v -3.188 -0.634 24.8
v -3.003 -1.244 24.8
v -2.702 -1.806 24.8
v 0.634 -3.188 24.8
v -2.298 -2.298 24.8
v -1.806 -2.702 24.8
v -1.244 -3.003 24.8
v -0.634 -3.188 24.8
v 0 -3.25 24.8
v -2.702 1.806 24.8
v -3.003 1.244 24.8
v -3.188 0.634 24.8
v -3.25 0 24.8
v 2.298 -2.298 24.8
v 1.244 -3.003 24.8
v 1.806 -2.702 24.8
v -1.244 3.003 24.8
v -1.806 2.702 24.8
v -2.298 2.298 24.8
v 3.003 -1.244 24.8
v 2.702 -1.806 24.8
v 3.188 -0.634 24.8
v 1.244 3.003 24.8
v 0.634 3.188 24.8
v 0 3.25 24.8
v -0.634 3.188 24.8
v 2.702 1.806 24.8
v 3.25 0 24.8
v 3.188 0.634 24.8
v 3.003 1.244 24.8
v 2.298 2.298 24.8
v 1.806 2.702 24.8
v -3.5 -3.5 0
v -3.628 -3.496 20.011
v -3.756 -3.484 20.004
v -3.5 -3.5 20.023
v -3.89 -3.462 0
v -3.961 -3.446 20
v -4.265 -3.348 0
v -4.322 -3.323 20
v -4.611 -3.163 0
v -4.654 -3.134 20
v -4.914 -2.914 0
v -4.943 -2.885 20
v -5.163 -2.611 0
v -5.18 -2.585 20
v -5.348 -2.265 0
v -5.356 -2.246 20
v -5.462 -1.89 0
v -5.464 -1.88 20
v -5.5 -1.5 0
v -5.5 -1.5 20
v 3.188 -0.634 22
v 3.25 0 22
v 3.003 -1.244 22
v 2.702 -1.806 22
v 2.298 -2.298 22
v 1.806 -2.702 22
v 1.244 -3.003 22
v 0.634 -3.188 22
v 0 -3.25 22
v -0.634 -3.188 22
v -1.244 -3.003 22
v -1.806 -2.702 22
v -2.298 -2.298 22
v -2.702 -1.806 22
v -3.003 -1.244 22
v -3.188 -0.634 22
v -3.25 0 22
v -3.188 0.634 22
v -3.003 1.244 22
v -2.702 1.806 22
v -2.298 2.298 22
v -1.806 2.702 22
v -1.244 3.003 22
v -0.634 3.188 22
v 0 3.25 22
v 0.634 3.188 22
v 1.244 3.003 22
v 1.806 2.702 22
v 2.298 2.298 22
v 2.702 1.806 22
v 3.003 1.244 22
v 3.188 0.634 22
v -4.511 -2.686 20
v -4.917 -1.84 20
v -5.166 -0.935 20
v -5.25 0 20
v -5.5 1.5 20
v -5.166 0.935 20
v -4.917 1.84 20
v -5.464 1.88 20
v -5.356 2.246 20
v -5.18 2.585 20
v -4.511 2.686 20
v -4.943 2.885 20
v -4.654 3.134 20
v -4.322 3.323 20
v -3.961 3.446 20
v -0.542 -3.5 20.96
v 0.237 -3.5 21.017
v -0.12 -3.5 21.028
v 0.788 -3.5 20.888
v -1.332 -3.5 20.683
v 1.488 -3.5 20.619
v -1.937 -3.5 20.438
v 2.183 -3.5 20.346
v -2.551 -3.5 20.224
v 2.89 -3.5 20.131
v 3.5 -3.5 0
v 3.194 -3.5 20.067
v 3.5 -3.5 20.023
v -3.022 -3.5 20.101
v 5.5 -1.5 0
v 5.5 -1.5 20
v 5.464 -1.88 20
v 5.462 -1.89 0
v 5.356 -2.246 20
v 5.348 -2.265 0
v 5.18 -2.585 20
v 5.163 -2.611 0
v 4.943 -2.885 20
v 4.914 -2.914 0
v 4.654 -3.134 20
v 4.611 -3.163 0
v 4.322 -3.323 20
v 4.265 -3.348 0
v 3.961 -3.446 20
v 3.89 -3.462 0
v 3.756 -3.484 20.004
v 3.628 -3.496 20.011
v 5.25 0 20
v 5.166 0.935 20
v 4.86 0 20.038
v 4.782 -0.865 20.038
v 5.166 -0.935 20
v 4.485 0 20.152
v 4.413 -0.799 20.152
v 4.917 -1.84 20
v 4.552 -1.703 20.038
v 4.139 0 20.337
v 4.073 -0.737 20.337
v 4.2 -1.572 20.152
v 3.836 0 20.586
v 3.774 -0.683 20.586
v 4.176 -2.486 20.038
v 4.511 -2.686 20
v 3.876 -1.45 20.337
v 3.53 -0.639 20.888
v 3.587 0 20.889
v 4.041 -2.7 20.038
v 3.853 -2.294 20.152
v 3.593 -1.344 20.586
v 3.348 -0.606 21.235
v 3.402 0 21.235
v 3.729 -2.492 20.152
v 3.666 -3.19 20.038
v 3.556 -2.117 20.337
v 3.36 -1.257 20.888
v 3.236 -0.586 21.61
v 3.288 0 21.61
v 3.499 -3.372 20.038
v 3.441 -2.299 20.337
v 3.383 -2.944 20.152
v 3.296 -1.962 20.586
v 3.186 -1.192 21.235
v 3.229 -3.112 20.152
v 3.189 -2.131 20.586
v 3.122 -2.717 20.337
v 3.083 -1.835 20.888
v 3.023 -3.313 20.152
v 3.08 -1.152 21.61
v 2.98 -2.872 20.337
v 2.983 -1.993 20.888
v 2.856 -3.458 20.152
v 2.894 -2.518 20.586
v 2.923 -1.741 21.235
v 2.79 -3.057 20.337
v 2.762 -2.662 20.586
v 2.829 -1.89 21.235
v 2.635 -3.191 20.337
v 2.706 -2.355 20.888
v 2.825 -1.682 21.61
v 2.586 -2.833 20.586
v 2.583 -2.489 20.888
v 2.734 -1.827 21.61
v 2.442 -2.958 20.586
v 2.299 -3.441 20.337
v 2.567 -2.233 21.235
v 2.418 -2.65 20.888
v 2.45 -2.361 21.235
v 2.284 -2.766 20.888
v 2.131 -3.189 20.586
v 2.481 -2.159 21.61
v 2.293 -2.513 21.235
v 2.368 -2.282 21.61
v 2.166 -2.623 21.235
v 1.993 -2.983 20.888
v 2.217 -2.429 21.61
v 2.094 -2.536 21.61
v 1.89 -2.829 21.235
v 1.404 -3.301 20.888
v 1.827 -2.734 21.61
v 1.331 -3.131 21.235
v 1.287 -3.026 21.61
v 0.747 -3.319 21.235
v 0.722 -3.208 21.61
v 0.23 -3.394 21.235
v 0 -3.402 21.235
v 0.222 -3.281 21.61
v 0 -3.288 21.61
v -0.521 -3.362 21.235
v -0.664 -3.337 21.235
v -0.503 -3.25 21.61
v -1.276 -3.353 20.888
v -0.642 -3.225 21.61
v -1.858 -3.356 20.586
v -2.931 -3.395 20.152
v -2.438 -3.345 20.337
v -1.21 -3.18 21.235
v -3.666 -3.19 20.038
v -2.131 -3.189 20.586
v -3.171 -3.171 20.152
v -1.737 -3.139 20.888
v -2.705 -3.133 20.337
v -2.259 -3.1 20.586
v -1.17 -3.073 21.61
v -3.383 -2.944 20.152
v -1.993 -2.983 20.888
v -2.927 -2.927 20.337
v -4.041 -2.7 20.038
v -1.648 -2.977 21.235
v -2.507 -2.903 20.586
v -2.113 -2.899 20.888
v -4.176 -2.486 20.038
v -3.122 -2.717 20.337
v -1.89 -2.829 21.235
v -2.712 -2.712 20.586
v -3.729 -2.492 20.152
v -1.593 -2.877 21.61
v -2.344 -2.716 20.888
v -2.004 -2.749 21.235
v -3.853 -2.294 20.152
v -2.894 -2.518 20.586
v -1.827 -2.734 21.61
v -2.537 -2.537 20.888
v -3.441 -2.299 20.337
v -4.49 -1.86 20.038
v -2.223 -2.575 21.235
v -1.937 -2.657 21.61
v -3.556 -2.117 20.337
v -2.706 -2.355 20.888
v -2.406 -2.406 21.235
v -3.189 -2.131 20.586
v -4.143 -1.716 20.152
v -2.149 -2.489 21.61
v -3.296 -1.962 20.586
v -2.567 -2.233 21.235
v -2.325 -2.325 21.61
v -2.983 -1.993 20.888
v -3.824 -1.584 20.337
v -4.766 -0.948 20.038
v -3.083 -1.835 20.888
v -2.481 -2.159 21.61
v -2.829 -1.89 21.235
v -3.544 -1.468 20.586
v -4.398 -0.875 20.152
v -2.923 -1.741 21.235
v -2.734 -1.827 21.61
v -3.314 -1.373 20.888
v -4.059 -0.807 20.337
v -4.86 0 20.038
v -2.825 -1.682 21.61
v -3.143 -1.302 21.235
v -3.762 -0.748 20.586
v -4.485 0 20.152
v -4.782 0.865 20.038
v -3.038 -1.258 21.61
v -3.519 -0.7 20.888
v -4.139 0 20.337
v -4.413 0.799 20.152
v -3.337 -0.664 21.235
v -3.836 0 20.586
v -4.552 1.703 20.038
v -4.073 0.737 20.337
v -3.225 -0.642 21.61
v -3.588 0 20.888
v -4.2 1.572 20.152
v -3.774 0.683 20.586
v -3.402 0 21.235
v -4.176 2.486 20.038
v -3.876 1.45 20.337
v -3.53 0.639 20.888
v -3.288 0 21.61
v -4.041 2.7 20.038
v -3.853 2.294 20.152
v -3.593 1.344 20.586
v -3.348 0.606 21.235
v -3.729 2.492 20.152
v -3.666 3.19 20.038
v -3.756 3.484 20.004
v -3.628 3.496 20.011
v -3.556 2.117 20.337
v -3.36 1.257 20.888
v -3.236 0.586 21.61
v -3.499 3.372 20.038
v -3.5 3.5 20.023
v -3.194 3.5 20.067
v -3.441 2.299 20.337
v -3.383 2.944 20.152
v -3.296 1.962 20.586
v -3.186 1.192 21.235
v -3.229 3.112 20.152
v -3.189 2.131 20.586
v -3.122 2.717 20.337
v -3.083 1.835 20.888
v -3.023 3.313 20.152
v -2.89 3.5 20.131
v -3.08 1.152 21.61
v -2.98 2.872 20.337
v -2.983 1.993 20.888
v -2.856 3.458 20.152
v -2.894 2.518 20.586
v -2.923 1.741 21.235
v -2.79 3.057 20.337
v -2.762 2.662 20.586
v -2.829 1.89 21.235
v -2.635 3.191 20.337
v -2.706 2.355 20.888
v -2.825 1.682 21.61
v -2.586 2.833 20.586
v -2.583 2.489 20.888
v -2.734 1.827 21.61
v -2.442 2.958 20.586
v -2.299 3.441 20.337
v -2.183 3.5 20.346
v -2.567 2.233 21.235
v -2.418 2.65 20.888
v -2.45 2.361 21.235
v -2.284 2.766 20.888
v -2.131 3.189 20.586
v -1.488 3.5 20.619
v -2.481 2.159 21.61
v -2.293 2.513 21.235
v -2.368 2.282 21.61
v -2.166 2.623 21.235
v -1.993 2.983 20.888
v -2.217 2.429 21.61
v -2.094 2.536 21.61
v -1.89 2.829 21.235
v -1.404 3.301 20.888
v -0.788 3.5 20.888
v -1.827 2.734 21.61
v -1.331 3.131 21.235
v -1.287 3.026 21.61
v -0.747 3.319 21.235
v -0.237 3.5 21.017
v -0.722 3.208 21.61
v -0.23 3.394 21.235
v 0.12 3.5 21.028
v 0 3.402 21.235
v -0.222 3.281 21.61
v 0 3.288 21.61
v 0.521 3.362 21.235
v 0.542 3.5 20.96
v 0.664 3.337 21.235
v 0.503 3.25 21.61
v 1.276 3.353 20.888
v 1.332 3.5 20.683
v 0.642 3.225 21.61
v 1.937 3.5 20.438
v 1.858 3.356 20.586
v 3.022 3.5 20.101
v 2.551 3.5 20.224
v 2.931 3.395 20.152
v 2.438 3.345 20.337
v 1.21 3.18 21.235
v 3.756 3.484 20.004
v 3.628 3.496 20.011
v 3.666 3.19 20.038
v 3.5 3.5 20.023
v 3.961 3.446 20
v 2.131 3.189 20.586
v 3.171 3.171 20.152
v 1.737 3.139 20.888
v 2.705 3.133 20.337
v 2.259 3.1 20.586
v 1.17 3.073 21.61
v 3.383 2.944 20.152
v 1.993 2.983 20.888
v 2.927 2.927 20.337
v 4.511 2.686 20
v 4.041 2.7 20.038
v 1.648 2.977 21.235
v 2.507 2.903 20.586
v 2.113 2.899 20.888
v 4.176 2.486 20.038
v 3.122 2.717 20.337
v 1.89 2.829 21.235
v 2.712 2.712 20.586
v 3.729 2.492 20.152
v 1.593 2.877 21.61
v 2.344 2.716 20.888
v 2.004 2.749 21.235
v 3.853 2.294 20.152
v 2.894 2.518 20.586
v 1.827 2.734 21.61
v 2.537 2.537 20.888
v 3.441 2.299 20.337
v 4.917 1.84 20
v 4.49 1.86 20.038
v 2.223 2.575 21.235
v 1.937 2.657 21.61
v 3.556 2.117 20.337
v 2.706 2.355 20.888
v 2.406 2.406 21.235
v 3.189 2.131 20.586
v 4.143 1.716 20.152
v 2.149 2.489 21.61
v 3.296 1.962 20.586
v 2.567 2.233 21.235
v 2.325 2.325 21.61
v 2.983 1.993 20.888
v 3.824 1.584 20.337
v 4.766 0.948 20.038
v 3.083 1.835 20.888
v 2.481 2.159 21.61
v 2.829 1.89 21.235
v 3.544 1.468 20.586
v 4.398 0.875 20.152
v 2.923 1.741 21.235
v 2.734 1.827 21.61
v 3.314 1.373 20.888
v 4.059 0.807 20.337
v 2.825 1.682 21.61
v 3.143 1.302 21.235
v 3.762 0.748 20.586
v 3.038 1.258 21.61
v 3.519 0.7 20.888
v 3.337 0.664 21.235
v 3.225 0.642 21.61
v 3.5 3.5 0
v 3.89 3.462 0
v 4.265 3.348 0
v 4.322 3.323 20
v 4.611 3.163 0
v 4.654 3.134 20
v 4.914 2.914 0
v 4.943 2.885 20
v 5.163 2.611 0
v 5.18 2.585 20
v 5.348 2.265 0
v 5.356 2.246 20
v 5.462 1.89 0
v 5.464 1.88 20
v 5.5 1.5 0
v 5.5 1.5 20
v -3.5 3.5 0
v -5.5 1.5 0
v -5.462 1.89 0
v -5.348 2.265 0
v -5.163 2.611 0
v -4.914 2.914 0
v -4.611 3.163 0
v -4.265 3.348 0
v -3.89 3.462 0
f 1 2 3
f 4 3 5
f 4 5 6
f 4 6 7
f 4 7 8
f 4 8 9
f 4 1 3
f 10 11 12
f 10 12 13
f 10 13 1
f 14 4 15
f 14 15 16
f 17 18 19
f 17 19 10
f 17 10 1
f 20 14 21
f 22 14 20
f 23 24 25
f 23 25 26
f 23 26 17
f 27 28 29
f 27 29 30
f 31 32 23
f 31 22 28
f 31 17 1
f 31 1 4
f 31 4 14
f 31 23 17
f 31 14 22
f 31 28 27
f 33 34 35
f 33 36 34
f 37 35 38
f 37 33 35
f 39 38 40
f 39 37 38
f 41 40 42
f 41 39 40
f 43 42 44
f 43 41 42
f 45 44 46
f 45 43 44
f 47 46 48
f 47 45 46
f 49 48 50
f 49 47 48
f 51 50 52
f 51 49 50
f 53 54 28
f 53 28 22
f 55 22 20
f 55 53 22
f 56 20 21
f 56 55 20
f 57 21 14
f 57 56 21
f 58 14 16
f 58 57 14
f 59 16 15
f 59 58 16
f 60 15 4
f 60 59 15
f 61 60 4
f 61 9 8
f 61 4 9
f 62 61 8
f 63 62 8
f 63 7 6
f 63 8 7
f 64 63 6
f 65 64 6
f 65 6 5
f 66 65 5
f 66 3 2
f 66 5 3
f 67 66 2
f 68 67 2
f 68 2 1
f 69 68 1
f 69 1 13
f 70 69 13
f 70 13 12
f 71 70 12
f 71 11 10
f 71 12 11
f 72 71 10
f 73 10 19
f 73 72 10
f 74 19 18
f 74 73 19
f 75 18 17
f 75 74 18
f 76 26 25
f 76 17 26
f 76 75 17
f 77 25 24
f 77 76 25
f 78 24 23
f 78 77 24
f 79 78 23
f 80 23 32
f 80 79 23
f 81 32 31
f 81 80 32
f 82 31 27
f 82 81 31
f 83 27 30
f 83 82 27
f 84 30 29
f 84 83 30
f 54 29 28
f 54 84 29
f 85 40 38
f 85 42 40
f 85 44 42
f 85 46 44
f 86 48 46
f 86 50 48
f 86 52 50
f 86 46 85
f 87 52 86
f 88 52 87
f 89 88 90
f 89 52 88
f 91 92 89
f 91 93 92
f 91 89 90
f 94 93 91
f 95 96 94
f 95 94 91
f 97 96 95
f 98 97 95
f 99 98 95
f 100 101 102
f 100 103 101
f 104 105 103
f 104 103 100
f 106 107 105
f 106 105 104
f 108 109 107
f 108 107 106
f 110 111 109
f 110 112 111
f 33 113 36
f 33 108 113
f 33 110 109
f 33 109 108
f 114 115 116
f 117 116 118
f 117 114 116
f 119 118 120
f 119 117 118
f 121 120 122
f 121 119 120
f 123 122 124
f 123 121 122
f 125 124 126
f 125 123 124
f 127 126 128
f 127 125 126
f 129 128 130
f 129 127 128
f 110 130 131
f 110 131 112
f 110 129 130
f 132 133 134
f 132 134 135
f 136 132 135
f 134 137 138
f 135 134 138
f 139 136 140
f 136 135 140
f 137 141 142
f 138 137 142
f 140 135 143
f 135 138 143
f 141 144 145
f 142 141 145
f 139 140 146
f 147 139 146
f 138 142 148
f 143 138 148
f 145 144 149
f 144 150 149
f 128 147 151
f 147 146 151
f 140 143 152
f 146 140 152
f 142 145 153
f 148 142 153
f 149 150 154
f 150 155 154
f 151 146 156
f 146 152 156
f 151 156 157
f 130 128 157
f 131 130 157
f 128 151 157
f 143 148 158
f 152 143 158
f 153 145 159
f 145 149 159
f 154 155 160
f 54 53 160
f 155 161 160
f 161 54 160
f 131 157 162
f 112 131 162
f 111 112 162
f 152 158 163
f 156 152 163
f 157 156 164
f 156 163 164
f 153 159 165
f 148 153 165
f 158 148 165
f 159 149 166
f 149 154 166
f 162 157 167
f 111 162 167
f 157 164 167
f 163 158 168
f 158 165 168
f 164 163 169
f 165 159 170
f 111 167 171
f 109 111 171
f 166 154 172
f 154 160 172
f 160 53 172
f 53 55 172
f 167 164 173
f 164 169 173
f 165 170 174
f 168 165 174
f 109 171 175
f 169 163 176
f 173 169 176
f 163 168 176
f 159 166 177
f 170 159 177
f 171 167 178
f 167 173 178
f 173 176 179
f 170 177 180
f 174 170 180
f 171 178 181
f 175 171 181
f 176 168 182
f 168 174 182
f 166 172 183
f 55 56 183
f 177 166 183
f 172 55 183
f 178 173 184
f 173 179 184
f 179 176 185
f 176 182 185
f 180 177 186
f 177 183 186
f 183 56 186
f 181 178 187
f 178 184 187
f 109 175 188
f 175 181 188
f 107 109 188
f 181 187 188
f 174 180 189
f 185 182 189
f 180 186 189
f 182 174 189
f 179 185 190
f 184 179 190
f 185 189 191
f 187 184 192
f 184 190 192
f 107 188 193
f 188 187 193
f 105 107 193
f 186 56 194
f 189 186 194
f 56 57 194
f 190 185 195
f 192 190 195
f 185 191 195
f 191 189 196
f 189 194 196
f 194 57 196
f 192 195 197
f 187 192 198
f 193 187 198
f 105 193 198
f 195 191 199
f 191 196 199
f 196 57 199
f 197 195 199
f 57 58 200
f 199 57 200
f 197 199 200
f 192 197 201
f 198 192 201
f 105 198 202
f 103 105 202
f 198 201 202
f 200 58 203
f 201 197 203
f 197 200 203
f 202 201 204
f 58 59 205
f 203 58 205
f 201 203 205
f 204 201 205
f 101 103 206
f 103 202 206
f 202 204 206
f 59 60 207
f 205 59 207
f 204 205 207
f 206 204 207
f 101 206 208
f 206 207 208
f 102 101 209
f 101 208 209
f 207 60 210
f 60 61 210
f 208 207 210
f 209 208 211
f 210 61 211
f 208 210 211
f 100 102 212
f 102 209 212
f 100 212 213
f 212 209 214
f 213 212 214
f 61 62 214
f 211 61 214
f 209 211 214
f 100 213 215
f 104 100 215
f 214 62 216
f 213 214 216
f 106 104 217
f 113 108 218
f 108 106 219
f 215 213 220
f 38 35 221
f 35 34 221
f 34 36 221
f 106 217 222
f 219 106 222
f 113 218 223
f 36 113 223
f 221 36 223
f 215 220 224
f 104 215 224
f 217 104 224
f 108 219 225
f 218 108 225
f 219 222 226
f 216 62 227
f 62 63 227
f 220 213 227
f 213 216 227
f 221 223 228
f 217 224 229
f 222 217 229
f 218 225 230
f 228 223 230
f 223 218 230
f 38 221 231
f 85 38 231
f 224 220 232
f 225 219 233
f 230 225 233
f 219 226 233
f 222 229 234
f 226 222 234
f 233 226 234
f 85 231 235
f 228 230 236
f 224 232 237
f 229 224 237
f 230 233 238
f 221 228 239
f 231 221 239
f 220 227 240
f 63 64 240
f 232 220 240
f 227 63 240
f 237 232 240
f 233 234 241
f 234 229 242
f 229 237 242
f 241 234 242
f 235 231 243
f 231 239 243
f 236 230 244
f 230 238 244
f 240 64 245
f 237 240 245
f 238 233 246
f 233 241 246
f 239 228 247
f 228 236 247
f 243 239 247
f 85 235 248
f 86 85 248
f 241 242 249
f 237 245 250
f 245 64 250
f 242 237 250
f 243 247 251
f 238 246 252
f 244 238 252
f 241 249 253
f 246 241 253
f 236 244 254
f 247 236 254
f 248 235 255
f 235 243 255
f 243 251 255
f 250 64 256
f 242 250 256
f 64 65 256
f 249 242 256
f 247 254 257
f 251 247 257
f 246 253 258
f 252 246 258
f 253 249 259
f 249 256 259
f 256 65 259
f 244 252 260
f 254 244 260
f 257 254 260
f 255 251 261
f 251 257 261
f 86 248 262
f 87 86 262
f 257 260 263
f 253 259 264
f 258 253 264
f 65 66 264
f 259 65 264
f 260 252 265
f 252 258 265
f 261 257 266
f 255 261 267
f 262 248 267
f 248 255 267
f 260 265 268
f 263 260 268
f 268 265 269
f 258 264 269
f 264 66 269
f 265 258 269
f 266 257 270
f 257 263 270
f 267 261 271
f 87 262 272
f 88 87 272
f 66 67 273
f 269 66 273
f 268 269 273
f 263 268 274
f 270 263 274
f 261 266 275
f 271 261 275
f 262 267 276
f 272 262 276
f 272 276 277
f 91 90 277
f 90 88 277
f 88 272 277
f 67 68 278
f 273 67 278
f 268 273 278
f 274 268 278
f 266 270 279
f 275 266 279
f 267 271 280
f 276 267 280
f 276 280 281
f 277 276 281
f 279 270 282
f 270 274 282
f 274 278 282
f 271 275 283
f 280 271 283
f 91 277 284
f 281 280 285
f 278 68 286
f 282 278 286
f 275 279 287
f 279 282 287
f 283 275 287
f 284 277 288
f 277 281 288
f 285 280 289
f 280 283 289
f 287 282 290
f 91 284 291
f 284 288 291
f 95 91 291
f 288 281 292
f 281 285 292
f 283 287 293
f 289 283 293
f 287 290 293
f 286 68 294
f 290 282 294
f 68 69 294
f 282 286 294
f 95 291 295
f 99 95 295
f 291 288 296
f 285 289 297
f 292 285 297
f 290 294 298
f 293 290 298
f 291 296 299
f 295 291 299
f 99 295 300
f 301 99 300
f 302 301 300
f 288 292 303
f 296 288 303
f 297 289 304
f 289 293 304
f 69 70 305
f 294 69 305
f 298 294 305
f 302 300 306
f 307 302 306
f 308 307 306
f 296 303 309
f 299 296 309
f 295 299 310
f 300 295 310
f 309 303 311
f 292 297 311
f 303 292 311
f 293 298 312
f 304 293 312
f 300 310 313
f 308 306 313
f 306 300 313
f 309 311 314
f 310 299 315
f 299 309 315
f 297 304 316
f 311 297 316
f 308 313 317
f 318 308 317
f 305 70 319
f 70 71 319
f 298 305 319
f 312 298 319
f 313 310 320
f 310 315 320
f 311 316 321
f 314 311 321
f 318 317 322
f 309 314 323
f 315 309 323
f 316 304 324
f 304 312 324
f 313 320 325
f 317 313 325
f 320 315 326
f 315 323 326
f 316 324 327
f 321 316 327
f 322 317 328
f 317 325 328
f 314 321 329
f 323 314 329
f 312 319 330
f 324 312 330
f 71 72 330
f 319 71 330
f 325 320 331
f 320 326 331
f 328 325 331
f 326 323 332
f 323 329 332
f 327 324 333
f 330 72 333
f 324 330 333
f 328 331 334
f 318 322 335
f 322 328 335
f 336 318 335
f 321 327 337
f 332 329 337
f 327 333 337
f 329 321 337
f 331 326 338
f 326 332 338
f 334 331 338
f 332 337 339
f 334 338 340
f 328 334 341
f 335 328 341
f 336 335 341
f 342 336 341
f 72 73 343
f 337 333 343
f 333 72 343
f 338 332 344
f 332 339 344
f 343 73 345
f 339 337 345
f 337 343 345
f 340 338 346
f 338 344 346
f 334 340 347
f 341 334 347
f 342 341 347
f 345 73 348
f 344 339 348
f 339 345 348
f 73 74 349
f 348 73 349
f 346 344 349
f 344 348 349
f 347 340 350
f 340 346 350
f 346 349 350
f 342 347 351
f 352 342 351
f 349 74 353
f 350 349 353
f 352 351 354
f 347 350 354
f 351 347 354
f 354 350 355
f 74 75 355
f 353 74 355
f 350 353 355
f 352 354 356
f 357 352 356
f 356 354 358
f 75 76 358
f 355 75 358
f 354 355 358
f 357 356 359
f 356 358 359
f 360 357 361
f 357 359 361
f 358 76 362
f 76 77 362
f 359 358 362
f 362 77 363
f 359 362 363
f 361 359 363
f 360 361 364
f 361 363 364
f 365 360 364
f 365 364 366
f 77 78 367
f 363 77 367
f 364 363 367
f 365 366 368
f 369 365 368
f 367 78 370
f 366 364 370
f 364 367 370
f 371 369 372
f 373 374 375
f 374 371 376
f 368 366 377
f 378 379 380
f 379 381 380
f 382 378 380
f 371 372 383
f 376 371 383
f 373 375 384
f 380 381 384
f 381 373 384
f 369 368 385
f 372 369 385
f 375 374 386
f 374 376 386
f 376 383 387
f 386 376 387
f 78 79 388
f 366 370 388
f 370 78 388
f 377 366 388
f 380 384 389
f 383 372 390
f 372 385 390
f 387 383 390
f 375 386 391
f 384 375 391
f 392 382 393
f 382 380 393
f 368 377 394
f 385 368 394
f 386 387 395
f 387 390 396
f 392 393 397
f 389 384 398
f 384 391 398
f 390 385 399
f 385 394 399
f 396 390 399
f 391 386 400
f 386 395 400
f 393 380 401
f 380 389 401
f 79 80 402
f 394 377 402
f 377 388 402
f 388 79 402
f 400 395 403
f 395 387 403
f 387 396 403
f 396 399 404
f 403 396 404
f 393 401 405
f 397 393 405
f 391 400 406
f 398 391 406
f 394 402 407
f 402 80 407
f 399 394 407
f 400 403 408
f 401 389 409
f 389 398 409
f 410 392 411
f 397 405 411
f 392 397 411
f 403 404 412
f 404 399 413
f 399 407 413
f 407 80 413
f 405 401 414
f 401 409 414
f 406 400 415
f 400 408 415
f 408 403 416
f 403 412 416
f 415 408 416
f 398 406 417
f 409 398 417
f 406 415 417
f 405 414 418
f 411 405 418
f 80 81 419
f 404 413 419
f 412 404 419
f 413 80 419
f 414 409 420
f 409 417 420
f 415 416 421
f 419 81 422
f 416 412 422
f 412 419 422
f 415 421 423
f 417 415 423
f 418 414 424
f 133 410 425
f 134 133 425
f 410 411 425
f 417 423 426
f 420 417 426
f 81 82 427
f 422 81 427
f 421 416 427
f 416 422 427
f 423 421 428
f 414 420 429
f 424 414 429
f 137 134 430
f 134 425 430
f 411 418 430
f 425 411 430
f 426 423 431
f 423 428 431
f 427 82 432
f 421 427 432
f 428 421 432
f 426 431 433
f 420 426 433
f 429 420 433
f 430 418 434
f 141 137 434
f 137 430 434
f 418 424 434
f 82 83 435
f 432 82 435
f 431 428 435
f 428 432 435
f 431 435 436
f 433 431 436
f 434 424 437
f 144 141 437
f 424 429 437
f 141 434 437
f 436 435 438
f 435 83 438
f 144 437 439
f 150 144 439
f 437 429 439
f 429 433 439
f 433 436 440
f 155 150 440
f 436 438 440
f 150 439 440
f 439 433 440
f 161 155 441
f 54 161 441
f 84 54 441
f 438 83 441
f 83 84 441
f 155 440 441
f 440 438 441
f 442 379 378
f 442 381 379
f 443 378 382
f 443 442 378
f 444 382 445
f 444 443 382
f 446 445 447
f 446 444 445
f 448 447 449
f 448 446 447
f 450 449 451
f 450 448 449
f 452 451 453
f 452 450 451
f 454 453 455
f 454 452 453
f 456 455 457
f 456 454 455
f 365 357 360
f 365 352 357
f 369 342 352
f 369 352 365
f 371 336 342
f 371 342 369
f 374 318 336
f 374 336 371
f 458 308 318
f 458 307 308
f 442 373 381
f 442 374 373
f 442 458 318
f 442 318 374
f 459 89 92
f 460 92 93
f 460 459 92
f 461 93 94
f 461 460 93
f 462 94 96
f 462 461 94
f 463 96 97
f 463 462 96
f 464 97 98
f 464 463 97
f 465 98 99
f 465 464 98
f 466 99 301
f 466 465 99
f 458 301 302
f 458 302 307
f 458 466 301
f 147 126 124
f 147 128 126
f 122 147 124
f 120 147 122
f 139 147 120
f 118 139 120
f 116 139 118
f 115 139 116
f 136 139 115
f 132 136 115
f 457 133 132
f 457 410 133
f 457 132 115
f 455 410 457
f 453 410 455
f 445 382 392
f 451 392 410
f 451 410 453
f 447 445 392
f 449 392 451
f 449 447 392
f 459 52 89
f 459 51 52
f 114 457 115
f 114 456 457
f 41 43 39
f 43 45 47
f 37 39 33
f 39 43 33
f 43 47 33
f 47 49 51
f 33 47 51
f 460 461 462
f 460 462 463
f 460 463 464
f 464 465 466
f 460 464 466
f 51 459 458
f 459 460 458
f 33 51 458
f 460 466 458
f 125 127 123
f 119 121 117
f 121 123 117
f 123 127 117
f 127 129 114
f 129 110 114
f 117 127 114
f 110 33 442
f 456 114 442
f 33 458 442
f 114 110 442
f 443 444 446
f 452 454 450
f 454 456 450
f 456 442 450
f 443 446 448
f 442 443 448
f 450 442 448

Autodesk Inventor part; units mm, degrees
ref_plane "YZ Plane" through (0, 0, 0) normal (1, 0, 0) x (0, 1, 0)
ref_plane "XZ Plane" through (0, 0, 0) normal (0, 1, 0) x (-1, 0, 0)
ref_plane "XY Plane" through (0, 0, 0) normal (0, 0, 1) x (1, 0, 0)
sketch "Sketch1" plane through (0, 0, 0) normal (0, 0, 1) x (1, 0, 0)
  line L0 (-5.5, 3.5) -> (5.5, 3.5)
  line L1 (5.5, 3.5) -> (5.5, -3.5)
  line L2 (5.5, -3.5) -> (-5.5, -3.5)
  line L3 (-5.5, -3.5) -> (-5.5, 3.5)
  line L4 (-5.5, 3.5) -> (5.5, -3.5) construction
  line L5 (5.5, 3.5) -> (-5.5, -3.5) construction
  point P0 (0, 0)
  dimension "d0" = 11
  dimension "d1" = 7
extrude "Extrusion1" add sketch "Sketch1" along normal blind 20
sketch "Sketch2" plane through (0, 0, 20) normal (0, 0, 1) x (1, 0, 0)
  circle A0 centre (0, 0) radius 3.25
  dimension "d4" = 6.5
extrude "Extrusion2" add sketch "Sketch2" along normal blind 4.8
fillet "Fillet1" radius 2 5 edges at (5.5, 3.5, 10) (5.5, -3.5, 10) (-5.5, 3.5, 10) (-5.5, -3.5, 10) (-3.25, 0, 20)
properties part number "Cable_Usb_C"
